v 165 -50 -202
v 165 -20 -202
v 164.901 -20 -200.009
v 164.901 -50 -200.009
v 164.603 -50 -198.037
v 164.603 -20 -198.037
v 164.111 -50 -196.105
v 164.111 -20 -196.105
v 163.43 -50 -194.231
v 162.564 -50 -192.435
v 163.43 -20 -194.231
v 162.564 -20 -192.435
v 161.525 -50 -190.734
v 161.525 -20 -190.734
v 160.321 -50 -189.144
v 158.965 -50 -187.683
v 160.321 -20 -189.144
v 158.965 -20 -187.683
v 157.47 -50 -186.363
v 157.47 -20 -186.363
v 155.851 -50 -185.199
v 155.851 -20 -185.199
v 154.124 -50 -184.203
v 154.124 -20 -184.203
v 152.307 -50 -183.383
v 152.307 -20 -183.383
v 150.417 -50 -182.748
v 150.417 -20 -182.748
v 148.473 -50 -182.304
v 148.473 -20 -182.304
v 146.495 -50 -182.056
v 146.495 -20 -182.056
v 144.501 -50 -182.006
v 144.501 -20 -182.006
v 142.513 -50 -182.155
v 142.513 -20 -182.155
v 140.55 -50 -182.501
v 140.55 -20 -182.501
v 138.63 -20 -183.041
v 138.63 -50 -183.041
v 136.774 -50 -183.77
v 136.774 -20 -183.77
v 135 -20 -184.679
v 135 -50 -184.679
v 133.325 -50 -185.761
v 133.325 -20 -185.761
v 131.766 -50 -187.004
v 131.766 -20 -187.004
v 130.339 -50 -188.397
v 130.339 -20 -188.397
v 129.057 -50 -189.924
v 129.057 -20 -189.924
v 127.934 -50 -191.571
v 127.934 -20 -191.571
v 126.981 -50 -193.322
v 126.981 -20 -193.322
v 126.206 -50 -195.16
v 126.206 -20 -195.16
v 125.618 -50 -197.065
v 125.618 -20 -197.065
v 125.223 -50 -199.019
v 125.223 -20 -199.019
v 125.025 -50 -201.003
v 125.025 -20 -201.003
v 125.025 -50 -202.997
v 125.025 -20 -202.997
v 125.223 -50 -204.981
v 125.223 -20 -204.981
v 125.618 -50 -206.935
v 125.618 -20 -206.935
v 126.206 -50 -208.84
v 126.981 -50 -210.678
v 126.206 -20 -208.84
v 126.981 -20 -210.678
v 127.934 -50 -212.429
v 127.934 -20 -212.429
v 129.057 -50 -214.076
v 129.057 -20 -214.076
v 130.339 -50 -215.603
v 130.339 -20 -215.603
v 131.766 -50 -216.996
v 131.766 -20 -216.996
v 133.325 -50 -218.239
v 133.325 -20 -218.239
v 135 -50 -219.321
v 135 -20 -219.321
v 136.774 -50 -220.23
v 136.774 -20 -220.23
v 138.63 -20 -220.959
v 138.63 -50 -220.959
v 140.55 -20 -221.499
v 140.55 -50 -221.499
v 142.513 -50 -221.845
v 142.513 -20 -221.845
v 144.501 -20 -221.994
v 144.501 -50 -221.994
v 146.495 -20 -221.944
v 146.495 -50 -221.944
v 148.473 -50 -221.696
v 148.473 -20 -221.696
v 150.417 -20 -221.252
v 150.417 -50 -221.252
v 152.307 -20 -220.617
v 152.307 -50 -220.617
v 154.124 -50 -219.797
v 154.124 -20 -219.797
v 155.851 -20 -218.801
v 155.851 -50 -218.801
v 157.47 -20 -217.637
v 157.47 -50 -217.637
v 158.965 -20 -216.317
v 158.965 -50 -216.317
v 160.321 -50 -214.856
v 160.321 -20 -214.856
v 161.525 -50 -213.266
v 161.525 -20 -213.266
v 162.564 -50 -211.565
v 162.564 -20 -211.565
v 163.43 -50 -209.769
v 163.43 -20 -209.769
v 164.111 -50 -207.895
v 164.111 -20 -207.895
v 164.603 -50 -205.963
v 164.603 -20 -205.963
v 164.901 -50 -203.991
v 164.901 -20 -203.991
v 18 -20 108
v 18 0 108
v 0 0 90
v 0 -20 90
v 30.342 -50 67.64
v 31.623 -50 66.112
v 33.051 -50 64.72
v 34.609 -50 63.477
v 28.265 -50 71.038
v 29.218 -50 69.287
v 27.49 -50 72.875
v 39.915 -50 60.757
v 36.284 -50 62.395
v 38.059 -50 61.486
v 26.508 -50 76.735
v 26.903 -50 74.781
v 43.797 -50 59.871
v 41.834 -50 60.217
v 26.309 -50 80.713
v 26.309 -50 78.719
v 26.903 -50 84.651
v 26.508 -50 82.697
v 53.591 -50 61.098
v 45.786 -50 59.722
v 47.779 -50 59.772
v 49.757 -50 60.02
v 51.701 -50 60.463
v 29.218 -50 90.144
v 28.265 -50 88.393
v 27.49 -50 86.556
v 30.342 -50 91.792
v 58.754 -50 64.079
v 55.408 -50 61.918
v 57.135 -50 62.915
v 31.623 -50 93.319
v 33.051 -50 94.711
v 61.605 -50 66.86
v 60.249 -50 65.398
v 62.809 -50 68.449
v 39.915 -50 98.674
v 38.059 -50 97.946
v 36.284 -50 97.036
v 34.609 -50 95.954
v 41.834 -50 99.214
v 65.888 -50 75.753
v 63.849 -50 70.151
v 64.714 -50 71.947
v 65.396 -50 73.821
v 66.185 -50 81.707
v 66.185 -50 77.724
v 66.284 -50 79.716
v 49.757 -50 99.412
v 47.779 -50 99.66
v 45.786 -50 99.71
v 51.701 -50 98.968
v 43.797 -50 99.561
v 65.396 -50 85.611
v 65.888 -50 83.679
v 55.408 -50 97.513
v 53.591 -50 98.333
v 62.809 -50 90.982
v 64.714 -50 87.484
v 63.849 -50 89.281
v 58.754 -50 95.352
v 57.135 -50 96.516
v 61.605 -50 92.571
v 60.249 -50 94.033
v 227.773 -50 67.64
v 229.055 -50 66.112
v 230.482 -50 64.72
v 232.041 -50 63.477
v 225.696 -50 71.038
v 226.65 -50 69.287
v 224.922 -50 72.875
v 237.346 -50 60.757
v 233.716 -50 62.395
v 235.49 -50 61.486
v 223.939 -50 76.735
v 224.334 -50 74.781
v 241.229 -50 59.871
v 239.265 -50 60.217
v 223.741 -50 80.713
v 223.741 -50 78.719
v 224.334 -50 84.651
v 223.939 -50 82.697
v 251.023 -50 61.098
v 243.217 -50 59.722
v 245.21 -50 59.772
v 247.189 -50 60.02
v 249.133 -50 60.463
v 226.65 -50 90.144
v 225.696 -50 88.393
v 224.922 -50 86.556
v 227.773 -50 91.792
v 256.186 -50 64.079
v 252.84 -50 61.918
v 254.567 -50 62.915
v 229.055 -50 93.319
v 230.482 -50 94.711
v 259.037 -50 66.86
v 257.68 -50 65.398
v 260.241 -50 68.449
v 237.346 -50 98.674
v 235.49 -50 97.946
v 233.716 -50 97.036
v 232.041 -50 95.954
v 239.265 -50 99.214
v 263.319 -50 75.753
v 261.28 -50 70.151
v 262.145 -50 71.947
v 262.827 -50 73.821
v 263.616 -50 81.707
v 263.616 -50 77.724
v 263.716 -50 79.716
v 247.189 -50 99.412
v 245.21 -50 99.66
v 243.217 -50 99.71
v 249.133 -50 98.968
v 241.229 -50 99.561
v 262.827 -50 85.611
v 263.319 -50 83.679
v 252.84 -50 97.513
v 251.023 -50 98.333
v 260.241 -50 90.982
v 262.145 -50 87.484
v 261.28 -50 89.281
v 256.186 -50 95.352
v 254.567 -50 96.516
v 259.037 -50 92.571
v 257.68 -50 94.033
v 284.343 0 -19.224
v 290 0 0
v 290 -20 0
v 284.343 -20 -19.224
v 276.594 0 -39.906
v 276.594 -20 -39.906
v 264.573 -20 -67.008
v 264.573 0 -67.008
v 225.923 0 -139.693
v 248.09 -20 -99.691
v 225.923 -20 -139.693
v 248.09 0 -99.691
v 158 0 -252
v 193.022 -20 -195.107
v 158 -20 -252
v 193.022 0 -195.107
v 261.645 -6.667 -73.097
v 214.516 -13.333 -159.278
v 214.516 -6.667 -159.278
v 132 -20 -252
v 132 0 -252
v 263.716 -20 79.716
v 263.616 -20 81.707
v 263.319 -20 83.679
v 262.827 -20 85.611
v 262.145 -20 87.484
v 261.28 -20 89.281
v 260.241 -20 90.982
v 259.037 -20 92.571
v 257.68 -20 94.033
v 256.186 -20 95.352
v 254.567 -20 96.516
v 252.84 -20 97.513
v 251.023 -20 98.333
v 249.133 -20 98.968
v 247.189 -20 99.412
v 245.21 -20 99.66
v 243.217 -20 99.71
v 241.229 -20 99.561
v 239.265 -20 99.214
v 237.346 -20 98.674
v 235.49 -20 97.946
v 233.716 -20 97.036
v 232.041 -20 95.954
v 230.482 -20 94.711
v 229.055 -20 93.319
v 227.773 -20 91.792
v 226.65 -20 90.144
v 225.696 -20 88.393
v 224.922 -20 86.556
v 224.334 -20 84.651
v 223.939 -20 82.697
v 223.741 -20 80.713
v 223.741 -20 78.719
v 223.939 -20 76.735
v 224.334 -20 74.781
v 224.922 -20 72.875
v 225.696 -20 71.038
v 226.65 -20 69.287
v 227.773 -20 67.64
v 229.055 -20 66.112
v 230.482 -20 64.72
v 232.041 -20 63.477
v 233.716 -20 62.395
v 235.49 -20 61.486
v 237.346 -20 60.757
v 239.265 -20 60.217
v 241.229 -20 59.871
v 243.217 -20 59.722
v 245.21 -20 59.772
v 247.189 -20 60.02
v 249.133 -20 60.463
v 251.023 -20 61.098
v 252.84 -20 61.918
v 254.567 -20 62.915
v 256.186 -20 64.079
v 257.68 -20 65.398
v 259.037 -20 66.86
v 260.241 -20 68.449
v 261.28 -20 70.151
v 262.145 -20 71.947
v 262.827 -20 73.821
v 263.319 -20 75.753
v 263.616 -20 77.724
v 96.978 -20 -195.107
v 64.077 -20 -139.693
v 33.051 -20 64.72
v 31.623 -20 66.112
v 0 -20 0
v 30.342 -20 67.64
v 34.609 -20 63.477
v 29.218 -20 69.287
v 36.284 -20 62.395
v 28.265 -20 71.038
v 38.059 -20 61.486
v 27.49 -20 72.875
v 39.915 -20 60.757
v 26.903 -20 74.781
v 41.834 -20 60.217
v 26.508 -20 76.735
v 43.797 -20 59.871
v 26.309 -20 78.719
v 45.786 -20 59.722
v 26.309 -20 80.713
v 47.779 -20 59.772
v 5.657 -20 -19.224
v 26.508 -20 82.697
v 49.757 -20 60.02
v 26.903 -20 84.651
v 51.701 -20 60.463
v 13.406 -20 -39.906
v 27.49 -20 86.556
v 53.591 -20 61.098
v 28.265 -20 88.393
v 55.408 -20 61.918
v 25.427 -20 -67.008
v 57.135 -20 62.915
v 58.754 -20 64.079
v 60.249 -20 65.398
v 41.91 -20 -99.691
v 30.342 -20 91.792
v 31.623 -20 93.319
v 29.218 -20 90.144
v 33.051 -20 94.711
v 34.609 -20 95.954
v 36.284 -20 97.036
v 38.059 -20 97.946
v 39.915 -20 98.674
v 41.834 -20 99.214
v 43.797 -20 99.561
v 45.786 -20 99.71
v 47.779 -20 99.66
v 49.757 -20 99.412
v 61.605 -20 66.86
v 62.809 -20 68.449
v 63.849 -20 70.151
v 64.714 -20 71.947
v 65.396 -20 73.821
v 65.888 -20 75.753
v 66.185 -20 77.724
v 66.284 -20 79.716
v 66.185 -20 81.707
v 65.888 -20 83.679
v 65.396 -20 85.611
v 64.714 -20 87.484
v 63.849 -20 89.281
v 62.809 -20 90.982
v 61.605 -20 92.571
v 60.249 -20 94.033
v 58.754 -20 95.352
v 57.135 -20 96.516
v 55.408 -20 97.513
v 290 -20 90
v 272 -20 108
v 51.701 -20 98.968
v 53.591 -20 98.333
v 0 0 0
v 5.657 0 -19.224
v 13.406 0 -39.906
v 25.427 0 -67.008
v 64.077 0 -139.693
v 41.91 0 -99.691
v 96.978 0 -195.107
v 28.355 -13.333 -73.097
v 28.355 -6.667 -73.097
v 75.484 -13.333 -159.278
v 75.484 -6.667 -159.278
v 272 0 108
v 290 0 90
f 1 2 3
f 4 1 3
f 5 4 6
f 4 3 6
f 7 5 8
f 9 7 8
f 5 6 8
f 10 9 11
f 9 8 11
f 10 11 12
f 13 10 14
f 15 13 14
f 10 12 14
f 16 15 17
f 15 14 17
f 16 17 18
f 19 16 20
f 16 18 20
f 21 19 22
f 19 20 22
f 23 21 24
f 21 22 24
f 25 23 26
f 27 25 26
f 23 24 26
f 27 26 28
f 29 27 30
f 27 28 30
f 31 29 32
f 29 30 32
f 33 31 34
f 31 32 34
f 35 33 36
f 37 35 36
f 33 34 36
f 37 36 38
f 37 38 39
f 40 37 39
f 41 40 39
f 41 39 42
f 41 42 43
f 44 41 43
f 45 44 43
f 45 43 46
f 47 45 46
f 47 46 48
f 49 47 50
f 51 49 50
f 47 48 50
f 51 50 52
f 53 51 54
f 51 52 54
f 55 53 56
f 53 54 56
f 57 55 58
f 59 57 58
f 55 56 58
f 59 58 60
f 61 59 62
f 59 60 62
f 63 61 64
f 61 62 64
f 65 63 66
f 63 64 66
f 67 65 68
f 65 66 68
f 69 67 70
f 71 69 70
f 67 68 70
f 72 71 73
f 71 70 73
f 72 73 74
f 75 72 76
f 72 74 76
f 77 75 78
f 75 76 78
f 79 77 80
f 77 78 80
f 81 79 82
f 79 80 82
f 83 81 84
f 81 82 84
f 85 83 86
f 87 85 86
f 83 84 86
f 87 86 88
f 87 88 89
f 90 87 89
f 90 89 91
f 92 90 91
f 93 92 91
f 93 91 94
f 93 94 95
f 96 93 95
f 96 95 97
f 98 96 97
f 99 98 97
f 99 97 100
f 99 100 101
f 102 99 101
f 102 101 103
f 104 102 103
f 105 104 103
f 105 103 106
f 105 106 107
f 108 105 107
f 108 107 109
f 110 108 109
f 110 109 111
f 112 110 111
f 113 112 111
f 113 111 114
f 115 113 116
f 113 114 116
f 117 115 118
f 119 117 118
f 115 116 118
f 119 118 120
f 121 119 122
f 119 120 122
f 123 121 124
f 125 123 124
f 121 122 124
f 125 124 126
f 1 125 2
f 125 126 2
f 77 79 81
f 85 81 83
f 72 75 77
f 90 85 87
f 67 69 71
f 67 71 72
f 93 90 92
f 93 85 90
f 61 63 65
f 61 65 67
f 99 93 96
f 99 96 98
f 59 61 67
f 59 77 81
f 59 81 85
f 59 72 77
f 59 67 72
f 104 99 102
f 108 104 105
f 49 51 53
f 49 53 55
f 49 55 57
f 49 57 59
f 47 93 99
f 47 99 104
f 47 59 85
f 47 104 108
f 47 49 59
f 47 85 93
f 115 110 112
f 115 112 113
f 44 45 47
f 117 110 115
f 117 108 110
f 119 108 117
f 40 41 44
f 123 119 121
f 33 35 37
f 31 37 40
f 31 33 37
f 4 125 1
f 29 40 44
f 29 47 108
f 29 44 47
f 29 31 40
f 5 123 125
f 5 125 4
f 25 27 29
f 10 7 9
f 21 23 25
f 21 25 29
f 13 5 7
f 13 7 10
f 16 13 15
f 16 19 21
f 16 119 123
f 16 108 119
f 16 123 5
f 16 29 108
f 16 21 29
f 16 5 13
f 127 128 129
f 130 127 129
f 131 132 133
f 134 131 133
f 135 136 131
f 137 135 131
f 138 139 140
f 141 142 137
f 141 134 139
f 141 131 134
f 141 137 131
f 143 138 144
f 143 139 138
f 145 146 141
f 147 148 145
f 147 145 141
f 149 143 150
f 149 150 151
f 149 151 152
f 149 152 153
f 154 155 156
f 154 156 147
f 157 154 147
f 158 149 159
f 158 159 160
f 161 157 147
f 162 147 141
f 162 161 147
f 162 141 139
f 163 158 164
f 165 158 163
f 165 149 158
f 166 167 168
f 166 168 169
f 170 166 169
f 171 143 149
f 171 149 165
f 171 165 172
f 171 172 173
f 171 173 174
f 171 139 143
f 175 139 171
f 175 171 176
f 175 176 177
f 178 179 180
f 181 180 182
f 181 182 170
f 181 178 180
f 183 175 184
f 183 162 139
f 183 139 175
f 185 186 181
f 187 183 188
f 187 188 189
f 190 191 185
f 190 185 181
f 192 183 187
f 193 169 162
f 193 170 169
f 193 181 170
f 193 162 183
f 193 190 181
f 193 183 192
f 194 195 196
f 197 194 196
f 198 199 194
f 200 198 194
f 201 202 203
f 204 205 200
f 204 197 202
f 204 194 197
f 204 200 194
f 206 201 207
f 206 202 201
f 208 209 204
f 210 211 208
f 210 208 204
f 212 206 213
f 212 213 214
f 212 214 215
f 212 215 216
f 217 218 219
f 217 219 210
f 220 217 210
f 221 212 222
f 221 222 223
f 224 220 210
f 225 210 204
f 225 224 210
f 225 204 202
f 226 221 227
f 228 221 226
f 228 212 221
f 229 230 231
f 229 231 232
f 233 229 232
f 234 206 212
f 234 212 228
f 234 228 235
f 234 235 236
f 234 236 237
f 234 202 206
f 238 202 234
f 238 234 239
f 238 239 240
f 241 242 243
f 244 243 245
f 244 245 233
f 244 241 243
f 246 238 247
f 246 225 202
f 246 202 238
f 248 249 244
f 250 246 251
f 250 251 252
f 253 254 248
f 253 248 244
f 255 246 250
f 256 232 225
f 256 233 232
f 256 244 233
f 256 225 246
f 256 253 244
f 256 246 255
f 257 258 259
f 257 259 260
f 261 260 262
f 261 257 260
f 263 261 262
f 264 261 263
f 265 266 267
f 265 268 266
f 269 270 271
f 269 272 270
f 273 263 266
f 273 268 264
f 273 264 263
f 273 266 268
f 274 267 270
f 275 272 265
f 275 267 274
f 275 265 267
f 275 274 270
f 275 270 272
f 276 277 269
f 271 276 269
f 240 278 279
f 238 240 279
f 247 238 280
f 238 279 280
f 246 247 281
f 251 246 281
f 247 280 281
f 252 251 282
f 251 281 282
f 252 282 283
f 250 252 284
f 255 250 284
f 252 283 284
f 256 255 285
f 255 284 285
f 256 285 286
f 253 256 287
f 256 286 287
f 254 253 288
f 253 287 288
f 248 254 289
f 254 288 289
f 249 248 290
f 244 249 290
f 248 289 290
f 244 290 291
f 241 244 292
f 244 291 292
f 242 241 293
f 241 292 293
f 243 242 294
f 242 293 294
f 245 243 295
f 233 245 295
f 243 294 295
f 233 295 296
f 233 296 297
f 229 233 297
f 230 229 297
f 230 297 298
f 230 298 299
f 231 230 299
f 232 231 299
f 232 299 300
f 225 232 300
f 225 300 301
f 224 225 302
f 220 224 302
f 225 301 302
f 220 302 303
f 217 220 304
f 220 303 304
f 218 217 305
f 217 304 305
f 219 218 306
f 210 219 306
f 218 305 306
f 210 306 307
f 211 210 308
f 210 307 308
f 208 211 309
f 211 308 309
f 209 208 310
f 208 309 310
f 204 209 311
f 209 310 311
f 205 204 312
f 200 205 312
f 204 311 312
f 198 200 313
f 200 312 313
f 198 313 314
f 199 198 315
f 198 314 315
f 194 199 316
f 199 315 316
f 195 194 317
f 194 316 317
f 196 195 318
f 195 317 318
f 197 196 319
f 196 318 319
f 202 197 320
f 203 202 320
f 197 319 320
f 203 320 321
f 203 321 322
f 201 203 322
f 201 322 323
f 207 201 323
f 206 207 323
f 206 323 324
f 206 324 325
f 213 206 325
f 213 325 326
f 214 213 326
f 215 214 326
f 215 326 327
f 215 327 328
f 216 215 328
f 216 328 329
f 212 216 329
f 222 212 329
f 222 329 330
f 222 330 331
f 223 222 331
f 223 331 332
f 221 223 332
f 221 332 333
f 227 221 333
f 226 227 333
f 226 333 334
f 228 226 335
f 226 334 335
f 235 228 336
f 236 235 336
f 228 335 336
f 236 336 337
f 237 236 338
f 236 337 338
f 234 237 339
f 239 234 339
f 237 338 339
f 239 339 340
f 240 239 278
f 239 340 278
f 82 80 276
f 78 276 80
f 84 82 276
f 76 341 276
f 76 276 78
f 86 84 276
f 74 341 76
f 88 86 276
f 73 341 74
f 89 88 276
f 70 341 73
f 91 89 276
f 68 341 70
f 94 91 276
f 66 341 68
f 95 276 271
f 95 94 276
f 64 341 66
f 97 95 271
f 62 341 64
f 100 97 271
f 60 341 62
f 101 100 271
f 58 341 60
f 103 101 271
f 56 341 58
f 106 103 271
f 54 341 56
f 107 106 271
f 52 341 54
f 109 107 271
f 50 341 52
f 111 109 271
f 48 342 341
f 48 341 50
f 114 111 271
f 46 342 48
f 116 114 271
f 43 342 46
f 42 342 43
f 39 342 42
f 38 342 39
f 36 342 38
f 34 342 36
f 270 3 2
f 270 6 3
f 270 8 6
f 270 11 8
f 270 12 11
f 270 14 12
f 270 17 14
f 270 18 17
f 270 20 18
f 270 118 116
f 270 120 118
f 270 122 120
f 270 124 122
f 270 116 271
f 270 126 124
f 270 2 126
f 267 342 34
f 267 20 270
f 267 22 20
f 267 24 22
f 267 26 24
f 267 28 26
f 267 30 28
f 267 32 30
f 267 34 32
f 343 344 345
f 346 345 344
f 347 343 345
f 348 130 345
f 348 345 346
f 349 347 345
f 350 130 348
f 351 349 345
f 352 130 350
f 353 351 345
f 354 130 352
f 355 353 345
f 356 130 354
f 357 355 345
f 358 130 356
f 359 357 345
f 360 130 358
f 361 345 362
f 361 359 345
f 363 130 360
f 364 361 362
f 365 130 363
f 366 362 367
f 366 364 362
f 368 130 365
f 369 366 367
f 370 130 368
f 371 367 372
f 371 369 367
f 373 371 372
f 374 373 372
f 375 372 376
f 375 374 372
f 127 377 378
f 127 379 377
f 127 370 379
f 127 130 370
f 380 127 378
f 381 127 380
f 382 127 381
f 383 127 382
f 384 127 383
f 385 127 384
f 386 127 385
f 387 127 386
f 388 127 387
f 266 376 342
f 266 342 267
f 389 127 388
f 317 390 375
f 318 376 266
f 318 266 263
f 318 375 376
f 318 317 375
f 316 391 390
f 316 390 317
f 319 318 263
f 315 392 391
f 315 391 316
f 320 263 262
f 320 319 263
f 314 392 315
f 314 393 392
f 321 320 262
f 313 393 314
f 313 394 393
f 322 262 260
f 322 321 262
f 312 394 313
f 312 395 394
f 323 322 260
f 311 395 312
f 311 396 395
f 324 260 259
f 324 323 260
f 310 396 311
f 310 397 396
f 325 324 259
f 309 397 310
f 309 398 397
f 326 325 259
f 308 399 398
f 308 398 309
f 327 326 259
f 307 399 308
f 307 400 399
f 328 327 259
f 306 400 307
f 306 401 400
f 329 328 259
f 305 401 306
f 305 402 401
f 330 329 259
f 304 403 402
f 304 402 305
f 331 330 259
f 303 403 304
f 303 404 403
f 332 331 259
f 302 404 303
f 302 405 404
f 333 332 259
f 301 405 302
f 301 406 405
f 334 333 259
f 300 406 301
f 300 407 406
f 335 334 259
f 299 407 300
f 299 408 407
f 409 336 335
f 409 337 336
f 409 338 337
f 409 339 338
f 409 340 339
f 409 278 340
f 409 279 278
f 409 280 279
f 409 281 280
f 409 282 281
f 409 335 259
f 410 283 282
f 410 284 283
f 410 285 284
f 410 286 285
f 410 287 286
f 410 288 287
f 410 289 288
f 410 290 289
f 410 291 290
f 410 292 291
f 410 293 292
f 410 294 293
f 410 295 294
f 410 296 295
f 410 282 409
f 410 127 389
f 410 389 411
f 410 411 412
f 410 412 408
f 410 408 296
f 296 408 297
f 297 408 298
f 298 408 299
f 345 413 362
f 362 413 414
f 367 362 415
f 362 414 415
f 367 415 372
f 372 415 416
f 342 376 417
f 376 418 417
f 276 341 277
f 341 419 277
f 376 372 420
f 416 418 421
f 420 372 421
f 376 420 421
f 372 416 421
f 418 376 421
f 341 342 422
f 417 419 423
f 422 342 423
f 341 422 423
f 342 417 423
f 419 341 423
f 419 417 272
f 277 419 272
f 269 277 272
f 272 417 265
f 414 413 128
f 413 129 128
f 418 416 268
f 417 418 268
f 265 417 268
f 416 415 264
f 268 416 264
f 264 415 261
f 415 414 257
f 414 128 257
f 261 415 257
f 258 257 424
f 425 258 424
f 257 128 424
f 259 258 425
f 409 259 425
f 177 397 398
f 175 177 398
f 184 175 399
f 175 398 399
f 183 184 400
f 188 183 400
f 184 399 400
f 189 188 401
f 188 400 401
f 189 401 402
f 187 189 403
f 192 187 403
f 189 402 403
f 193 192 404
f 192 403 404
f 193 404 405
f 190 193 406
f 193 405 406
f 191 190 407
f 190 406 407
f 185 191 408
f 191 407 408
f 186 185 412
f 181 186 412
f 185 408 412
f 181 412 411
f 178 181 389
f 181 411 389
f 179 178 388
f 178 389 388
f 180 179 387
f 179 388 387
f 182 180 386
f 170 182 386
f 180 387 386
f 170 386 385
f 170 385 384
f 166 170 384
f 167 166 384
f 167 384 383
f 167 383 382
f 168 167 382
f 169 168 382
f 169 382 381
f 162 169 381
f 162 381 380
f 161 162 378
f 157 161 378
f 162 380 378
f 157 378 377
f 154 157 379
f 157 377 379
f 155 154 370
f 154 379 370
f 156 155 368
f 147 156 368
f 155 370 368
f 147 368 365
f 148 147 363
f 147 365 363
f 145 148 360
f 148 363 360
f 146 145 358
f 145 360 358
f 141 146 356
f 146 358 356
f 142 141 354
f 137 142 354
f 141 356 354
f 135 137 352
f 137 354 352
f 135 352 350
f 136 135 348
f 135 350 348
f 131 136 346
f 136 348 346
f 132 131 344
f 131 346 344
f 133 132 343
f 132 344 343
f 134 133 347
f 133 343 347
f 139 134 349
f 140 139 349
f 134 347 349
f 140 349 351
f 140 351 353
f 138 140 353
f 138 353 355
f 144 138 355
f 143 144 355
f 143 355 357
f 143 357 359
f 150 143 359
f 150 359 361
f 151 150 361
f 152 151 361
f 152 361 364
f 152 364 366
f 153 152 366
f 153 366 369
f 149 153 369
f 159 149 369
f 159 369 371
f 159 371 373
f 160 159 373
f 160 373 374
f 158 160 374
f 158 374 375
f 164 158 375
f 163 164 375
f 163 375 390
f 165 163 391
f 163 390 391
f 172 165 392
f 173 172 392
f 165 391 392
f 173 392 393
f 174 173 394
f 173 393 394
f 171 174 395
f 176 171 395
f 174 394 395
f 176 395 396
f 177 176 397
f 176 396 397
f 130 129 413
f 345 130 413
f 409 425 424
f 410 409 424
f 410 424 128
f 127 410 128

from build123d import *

# Parameters (mm, degrees)
F1_DEPTH = 20
F2_R     = 20
F3_DEPTH = 30


with BuildPart() as f1:
    # F0 (on Front) → F1 (new body)
    with BuildSketch(Plane.XZ):
        with BuildLine():
            add(Edge.make_bspline(
                [(0, 0), (15.8393937026, -64.3749522899), (73.9196968513, -158.1874761449), (132, -252)],
                knots=[0.3599862205, 0.3599862205, 0.3599862205, 0.3599862205, 1, 1, 1, 1], degree=3))
            Line((132, -252), (158, -252))
            add(Edge.make_bspline(
                [(290, 0), (274.1606062974, -64.3749522899), (216.0803031487, -158.1874761449), (158, -252)],
                knots=[0.3599862205, 0.3599862205, 0.3599862205, 0.3599862205, 1, 1, 1, 1], degree=3))
            Line((290, 0), (290, 90))
            Line((290, 90), (272, 108))
            Line((272, 108), (18, 108))
            Line((18, 108), (0, 90))
            Line((0, 90), (0, 0))
        make_face()
    extrude(amount=F1_DEPTH)

    # F2 (on face) → F3 (join)
    with BuildSketch(Plane.XZ.offset(20)):
        with Locations((46.2842712475, 79.7157287525)):
            Circle(F2_R)
        with Locations((243.7157287525, 79.7157287525)):
            Circle(F2_R)
        with Locations((145, -202)):
            Circle(F2_R)
    extrude(amount=F3_DEPTH)


solid = f1.part
